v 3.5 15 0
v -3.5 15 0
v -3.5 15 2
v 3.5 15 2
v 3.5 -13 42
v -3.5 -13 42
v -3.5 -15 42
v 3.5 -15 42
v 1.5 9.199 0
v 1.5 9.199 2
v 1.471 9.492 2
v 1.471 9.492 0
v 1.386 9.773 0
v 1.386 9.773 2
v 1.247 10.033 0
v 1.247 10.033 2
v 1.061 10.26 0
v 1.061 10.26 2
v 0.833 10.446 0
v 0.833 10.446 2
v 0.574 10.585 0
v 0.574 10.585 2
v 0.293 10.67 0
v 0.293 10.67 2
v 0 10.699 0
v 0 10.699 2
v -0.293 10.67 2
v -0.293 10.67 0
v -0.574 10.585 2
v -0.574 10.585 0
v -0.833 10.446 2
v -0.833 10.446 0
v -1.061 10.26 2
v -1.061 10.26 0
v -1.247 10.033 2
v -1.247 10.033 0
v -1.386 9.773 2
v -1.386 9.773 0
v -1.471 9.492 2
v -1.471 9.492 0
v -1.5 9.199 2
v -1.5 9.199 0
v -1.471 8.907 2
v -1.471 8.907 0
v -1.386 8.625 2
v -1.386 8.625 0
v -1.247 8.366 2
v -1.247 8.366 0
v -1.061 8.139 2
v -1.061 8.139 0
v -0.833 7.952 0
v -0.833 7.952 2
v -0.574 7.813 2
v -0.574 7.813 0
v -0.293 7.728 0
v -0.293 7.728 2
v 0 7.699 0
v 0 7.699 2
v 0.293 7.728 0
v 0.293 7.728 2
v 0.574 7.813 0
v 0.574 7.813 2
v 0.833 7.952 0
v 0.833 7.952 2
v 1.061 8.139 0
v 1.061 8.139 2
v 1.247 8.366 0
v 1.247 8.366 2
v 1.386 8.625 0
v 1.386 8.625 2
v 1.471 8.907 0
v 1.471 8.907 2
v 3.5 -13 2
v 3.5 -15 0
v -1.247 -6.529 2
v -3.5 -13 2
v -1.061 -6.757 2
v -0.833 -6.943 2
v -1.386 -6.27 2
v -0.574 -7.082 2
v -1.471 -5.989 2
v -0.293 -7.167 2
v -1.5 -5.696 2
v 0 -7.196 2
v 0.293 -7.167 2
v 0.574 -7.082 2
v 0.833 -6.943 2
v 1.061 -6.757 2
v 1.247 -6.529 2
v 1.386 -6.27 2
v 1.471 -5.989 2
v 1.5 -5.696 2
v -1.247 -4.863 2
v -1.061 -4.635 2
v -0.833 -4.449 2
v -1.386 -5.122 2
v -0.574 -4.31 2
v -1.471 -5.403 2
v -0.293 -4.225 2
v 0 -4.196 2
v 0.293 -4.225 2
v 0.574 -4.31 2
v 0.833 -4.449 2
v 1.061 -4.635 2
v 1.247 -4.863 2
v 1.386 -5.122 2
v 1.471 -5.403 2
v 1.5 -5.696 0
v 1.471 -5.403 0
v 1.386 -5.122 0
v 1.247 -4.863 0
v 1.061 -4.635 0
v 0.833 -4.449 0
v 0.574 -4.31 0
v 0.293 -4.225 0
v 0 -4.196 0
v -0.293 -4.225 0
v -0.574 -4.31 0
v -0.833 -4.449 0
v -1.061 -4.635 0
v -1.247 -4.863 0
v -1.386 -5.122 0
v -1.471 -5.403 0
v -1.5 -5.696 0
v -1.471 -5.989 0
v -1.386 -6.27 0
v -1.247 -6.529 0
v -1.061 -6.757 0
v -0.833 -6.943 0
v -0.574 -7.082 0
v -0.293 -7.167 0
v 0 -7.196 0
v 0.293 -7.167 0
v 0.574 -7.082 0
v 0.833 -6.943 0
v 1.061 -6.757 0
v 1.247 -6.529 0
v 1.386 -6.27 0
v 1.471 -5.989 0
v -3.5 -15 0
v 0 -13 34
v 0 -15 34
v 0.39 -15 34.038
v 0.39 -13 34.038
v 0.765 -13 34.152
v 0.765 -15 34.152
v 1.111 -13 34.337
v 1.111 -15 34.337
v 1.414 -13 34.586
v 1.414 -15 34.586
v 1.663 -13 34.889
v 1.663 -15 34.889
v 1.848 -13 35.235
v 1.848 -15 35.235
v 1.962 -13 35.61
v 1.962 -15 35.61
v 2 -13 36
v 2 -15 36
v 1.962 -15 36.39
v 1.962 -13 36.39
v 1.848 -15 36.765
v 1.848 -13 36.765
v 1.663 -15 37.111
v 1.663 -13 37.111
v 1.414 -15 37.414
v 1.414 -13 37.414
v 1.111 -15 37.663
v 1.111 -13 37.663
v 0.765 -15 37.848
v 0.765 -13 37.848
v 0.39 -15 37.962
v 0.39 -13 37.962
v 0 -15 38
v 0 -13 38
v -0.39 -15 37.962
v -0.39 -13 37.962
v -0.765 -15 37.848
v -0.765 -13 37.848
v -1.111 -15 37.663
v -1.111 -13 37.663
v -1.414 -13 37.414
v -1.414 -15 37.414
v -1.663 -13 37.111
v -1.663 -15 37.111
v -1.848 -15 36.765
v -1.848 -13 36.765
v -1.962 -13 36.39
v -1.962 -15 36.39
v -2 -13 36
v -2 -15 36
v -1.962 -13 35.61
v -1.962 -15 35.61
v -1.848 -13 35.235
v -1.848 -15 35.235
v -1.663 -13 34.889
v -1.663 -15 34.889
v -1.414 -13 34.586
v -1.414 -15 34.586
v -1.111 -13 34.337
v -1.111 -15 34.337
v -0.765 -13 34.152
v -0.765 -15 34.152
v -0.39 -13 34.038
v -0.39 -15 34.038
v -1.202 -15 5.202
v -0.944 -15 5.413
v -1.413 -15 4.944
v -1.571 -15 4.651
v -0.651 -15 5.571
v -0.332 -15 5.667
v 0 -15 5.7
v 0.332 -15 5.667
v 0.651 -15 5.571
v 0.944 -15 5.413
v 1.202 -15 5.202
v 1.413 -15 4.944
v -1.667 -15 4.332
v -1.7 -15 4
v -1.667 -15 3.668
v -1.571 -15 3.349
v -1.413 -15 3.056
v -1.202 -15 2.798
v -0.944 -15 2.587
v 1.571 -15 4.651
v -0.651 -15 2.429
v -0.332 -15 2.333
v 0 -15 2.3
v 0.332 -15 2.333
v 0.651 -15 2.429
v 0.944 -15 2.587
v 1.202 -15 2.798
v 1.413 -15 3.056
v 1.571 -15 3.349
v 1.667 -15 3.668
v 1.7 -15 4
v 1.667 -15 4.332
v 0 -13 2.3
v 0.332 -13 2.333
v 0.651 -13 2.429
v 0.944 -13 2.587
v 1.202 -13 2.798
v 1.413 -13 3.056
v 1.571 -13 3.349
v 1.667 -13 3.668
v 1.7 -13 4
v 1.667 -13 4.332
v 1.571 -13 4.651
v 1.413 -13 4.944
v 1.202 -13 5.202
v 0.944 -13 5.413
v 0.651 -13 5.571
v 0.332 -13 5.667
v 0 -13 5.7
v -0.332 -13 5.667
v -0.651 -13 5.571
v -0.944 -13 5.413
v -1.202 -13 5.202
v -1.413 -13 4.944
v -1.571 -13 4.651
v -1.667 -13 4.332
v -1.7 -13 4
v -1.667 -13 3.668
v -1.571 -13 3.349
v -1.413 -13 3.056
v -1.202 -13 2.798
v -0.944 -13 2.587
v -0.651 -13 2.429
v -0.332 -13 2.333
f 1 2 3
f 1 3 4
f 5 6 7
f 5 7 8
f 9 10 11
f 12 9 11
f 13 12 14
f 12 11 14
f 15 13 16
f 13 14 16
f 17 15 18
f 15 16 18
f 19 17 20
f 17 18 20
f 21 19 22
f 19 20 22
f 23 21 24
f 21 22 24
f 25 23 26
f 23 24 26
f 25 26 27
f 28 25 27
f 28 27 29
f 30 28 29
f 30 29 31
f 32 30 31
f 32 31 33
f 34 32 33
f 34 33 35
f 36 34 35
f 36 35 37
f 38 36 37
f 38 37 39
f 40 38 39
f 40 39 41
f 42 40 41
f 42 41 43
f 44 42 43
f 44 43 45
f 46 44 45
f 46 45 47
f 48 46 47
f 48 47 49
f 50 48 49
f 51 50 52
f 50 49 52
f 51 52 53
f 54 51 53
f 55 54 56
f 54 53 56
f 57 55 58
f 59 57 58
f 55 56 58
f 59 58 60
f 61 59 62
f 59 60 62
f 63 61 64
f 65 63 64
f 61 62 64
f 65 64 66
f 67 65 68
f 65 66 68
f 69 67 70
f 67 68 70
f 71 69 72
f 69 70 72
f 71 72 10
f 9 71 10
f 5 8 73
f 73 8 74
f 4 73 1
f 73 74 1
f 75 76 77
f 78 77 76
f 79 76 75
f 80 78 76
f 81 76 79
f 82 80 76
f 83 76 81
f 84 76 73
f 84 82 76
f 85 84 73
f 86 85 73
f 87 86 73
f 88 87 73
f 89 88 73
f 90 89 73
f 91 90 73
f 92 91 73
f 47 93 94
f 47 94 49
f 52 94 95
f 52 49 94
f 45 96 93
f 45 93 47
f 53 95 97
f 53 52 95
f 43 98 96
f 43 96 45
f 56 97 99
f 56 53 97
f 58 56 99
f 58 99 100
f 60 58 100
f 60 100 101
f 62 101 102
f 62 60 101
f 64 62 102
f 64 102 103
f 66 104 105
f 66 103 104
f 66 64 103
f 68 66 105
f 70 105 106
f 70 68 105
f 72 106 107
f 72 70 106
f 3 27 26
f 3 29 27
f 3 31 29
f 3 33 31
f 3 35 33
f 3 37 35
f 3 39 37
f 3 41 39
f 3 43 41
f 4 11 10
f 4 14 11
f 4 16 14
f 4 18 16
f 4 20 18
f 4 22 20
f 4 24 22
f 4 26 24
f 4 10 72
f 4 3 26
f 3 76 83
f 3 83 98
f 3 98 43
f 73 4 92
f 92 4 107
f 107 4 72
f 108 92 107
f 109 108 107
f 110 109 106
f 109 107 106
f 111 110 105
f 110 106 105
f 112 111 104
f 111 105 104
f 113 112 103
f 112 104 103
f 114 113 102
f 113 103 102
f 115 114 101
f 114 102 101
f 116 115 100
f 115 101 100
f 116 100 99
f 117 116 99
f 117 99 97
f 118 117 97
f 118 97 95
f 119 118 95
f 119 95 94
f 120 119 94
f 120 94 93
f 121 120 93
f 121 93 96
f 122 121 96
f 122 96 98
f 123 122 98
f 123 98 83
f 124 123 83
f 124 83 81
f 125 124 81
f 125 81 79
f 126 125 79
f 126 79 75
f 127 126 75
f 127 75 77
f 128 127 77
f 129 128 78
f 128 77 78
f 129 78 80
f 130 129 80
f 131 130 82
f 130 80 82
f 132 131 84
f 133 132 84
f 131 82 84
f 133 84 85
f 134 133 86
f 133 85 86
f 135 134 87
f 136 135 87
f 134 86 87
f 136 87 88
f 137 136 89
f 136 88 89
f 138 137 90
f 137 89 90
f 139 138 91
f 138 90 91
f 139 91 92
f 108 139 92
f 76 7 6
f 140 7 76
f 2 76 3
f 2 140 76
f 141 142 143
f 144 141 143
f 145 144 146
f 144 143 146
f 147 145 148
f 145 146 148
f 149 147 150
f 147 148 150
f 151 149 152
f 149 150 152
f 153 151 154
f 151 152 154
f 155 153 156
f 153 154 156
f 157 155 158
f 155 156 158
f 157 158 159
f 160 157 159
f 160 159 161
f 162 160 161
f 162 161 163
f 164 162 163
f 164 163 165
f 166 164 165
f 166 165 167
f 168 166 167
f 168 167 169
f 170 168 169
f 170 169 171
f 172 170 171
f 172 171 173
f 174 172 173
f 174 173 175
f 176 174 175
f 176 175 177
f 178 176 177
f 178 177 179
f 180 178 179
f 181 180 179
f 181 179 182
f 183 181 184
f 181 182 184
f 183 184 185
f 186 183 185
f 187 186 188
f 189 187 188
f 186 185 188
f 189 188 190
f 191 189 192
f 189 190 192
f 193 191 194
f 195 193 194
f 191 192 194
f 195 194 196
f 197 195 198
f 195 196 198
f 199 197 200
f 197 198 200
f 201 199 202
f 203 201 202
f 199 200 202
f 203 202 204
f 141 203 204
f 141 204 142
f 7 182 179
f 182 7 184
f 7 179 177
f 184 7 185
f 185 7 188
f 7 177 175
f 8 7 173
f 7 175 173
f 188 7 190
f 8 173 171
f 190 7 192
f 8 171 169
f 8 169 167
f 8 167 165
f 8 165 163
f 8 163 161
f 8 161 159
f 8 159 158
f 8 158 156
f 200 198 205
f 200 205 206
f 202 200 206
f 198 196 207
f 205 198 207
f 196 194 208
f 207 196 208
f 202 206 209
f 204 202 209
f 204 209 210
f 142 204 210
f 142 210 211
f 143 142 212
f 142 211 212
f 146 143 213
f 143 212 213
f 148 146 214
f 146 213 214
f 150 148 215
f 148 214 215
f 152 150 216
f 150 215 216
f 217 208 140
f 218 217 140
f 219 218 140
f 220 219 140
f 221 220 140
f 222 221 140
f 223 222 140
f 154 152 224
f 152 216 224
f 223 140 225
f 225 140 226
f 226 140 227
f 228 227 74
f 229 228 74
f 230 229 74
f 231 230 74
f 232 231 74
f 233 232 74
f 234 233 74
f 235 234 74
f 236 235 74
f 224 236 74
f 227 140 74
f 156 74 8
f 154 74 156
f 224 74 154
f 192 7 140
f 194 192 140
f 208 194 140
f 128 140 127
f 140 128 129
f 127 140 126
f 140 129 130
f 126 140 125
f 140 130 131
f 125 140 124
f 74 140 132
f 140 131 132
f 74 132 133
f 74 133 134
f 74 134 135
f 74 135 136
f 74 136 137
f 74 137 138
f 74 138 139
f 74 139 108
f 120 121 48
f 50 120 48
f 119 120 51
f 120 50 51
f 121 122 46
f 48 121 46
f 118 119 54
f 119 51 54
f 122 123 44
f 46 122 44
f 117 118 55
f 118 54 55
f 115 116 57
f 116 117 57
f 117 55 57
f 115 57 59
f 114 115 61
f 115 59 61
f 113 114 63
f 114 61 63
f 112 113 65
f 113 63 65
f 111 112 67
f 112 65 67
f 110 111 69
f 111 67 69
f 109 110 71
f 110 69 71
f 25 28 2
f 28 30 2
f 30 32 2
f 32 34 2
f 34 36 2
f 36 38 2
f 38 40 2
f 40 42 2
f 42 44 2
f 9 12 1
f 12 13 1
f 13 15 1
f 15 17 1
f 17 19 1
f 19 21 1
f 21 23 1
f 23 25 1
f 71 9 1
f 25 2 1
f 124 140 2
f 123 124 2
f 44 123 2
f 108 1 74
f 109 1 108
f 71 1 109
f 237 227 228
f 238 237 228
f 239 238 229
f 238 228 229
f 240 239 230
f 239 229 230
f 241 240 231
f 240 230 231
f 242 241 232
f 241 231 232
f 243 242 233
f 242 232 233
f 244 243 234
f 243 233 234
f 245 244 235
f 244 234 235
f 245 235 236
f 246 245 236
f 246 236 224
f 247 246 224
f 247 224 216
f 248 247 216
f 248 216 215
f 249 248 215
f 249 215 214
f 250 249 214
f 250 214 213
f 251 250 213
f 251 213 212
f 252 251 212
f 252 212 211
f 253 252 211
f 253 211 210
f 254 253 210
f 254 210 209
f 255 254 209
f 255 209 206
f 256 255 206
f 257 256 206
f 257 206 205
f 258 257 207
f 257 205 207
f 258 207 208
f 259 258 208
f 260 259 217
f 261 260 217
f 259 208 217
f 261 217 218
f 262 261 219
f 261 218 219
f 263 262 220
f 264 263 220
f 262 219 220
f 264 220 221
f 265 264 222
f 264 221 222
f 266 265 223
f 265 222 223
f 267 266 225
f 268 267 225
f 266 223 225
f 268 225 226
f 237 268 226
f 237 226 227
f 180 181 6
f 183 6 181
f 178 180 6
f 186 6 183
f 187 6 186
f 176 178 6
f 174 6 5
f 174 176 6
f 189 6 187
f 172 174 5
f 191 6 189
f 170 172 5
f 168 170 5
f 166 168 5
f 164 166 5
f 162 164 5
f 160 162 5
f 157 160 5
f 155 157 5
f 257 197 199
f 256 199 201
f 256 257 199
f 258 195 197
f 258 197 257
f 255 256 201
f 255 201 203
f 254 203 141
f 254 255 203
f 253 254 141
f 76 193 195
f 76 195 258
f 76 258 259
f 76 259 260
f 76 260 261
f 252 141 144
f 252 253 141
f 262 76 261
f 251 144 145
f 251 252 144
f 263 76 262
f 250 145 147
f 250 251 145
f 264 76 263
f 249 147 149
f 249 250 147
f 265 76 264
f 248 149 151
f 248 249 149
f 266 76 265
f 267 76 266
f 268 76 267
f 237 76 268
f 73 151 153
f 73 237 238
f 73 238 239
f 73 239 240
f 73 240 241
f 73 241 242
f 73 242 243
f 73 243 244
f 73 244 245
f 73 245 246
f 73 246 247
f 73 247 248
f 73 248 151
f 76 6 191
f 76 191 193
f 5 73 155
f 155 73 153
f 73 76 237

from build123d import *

# Parameters (mm, degrees)
ESBO_O2_W                = 7
ESBO_O2_H                = 30
RESSALTO_EXTRUS_O1_DEPTH = 2
ESBO_O3_W                = 7
ESBO_O3_H                = 2
RESSALTO_EXTRUS_O2_DEPTH = 40
CORTE_EXTRUS_O1_REACH    = 53.732
ESBO_O4_R                = 1.7
ESBO_O4_R_2              = 2
ESBO_O5_R                = 1.5
CORTE_EXTRUS_O2_DEPTH    = 10


with BuildPart() as part:
    # Esboço2 → Ressalto-extrusão1 (new body)
    with BuildSketch(Plane.XY):
        Rectangle(ESBO_O2_W, ESBO_O2_H)
    extrude(amount=RESSALTO_EXTRUS_O1_DEPTH)

    # Esboço3 → Ressalto-extrusão2 (add)
    with BuildSketch(Plane.XY.offset(2)):
        with Locations((0, -14)):
            Rectangle(ESBO_O3_W, ESBO_O3_H)
    extrude(amount=RESSALTO_EXTRUS_O2_DEPTH)

    # Esboço4 → Corte-extrusão1 (cut, up to next)
    with BuildSketch(Plane.XZ.offset(15), mode=Mode.PRIVATE) as corte_extrus_o1_sk1:
        with Locations(Location((0, 4, 0), (0, 0, 270))):
            Circle(ESBO_O4_R)
    corte_extrus_o1_tool1 = extrude(corte_extrus_o1_sk1.sketch, amount=-CORTE_EXTRUS_O1_REACH, mode=Mode.PRIVATE) & part.part
    # Esboço4 → Corte-extrusão1 (cut, up to next)
    with BuildSketch(Plane.XZ.offset(15), mode=Mode.PRIVATE) as corte_extrus_o1_sk2:
        with Locations(Location((0, 36, 0), (0, 0, 270))):
            Circle(ESBO_O4_R_2)
    corte_extrus_o1_tool2 = extrude(corte_extrus_o1_sk2.sketch, amount=-CORTE_EXTRUS_O1_REACH, mode=Mode.PRIVATE) & part.part
    add(corte_extrus_o1_tool1.solids().sort_by_distance((0, -15, 4))[0], mode=Mode.SUBTRACT)
    add(corte_extrus_o1_tool2.solids().sort_by_distance((0, -15, 36))[0], mode=Mode.SUBTRACT)

    # Esboço5 → Corte-extrusão2 (cut)
    with BuildSketch(Plane.XY.offset(2)):
        with Locations((0, -5.695873952)):
            Circle(ESBO_O5_R)
        with Locations((0, 9.199228267)):
            Circle(ESBO_O5_R)
    extrude(amount=-CORTE_EXTRUS_O2_DEPTH, mode=Mode.SUBTRACT)


solid = part.part
